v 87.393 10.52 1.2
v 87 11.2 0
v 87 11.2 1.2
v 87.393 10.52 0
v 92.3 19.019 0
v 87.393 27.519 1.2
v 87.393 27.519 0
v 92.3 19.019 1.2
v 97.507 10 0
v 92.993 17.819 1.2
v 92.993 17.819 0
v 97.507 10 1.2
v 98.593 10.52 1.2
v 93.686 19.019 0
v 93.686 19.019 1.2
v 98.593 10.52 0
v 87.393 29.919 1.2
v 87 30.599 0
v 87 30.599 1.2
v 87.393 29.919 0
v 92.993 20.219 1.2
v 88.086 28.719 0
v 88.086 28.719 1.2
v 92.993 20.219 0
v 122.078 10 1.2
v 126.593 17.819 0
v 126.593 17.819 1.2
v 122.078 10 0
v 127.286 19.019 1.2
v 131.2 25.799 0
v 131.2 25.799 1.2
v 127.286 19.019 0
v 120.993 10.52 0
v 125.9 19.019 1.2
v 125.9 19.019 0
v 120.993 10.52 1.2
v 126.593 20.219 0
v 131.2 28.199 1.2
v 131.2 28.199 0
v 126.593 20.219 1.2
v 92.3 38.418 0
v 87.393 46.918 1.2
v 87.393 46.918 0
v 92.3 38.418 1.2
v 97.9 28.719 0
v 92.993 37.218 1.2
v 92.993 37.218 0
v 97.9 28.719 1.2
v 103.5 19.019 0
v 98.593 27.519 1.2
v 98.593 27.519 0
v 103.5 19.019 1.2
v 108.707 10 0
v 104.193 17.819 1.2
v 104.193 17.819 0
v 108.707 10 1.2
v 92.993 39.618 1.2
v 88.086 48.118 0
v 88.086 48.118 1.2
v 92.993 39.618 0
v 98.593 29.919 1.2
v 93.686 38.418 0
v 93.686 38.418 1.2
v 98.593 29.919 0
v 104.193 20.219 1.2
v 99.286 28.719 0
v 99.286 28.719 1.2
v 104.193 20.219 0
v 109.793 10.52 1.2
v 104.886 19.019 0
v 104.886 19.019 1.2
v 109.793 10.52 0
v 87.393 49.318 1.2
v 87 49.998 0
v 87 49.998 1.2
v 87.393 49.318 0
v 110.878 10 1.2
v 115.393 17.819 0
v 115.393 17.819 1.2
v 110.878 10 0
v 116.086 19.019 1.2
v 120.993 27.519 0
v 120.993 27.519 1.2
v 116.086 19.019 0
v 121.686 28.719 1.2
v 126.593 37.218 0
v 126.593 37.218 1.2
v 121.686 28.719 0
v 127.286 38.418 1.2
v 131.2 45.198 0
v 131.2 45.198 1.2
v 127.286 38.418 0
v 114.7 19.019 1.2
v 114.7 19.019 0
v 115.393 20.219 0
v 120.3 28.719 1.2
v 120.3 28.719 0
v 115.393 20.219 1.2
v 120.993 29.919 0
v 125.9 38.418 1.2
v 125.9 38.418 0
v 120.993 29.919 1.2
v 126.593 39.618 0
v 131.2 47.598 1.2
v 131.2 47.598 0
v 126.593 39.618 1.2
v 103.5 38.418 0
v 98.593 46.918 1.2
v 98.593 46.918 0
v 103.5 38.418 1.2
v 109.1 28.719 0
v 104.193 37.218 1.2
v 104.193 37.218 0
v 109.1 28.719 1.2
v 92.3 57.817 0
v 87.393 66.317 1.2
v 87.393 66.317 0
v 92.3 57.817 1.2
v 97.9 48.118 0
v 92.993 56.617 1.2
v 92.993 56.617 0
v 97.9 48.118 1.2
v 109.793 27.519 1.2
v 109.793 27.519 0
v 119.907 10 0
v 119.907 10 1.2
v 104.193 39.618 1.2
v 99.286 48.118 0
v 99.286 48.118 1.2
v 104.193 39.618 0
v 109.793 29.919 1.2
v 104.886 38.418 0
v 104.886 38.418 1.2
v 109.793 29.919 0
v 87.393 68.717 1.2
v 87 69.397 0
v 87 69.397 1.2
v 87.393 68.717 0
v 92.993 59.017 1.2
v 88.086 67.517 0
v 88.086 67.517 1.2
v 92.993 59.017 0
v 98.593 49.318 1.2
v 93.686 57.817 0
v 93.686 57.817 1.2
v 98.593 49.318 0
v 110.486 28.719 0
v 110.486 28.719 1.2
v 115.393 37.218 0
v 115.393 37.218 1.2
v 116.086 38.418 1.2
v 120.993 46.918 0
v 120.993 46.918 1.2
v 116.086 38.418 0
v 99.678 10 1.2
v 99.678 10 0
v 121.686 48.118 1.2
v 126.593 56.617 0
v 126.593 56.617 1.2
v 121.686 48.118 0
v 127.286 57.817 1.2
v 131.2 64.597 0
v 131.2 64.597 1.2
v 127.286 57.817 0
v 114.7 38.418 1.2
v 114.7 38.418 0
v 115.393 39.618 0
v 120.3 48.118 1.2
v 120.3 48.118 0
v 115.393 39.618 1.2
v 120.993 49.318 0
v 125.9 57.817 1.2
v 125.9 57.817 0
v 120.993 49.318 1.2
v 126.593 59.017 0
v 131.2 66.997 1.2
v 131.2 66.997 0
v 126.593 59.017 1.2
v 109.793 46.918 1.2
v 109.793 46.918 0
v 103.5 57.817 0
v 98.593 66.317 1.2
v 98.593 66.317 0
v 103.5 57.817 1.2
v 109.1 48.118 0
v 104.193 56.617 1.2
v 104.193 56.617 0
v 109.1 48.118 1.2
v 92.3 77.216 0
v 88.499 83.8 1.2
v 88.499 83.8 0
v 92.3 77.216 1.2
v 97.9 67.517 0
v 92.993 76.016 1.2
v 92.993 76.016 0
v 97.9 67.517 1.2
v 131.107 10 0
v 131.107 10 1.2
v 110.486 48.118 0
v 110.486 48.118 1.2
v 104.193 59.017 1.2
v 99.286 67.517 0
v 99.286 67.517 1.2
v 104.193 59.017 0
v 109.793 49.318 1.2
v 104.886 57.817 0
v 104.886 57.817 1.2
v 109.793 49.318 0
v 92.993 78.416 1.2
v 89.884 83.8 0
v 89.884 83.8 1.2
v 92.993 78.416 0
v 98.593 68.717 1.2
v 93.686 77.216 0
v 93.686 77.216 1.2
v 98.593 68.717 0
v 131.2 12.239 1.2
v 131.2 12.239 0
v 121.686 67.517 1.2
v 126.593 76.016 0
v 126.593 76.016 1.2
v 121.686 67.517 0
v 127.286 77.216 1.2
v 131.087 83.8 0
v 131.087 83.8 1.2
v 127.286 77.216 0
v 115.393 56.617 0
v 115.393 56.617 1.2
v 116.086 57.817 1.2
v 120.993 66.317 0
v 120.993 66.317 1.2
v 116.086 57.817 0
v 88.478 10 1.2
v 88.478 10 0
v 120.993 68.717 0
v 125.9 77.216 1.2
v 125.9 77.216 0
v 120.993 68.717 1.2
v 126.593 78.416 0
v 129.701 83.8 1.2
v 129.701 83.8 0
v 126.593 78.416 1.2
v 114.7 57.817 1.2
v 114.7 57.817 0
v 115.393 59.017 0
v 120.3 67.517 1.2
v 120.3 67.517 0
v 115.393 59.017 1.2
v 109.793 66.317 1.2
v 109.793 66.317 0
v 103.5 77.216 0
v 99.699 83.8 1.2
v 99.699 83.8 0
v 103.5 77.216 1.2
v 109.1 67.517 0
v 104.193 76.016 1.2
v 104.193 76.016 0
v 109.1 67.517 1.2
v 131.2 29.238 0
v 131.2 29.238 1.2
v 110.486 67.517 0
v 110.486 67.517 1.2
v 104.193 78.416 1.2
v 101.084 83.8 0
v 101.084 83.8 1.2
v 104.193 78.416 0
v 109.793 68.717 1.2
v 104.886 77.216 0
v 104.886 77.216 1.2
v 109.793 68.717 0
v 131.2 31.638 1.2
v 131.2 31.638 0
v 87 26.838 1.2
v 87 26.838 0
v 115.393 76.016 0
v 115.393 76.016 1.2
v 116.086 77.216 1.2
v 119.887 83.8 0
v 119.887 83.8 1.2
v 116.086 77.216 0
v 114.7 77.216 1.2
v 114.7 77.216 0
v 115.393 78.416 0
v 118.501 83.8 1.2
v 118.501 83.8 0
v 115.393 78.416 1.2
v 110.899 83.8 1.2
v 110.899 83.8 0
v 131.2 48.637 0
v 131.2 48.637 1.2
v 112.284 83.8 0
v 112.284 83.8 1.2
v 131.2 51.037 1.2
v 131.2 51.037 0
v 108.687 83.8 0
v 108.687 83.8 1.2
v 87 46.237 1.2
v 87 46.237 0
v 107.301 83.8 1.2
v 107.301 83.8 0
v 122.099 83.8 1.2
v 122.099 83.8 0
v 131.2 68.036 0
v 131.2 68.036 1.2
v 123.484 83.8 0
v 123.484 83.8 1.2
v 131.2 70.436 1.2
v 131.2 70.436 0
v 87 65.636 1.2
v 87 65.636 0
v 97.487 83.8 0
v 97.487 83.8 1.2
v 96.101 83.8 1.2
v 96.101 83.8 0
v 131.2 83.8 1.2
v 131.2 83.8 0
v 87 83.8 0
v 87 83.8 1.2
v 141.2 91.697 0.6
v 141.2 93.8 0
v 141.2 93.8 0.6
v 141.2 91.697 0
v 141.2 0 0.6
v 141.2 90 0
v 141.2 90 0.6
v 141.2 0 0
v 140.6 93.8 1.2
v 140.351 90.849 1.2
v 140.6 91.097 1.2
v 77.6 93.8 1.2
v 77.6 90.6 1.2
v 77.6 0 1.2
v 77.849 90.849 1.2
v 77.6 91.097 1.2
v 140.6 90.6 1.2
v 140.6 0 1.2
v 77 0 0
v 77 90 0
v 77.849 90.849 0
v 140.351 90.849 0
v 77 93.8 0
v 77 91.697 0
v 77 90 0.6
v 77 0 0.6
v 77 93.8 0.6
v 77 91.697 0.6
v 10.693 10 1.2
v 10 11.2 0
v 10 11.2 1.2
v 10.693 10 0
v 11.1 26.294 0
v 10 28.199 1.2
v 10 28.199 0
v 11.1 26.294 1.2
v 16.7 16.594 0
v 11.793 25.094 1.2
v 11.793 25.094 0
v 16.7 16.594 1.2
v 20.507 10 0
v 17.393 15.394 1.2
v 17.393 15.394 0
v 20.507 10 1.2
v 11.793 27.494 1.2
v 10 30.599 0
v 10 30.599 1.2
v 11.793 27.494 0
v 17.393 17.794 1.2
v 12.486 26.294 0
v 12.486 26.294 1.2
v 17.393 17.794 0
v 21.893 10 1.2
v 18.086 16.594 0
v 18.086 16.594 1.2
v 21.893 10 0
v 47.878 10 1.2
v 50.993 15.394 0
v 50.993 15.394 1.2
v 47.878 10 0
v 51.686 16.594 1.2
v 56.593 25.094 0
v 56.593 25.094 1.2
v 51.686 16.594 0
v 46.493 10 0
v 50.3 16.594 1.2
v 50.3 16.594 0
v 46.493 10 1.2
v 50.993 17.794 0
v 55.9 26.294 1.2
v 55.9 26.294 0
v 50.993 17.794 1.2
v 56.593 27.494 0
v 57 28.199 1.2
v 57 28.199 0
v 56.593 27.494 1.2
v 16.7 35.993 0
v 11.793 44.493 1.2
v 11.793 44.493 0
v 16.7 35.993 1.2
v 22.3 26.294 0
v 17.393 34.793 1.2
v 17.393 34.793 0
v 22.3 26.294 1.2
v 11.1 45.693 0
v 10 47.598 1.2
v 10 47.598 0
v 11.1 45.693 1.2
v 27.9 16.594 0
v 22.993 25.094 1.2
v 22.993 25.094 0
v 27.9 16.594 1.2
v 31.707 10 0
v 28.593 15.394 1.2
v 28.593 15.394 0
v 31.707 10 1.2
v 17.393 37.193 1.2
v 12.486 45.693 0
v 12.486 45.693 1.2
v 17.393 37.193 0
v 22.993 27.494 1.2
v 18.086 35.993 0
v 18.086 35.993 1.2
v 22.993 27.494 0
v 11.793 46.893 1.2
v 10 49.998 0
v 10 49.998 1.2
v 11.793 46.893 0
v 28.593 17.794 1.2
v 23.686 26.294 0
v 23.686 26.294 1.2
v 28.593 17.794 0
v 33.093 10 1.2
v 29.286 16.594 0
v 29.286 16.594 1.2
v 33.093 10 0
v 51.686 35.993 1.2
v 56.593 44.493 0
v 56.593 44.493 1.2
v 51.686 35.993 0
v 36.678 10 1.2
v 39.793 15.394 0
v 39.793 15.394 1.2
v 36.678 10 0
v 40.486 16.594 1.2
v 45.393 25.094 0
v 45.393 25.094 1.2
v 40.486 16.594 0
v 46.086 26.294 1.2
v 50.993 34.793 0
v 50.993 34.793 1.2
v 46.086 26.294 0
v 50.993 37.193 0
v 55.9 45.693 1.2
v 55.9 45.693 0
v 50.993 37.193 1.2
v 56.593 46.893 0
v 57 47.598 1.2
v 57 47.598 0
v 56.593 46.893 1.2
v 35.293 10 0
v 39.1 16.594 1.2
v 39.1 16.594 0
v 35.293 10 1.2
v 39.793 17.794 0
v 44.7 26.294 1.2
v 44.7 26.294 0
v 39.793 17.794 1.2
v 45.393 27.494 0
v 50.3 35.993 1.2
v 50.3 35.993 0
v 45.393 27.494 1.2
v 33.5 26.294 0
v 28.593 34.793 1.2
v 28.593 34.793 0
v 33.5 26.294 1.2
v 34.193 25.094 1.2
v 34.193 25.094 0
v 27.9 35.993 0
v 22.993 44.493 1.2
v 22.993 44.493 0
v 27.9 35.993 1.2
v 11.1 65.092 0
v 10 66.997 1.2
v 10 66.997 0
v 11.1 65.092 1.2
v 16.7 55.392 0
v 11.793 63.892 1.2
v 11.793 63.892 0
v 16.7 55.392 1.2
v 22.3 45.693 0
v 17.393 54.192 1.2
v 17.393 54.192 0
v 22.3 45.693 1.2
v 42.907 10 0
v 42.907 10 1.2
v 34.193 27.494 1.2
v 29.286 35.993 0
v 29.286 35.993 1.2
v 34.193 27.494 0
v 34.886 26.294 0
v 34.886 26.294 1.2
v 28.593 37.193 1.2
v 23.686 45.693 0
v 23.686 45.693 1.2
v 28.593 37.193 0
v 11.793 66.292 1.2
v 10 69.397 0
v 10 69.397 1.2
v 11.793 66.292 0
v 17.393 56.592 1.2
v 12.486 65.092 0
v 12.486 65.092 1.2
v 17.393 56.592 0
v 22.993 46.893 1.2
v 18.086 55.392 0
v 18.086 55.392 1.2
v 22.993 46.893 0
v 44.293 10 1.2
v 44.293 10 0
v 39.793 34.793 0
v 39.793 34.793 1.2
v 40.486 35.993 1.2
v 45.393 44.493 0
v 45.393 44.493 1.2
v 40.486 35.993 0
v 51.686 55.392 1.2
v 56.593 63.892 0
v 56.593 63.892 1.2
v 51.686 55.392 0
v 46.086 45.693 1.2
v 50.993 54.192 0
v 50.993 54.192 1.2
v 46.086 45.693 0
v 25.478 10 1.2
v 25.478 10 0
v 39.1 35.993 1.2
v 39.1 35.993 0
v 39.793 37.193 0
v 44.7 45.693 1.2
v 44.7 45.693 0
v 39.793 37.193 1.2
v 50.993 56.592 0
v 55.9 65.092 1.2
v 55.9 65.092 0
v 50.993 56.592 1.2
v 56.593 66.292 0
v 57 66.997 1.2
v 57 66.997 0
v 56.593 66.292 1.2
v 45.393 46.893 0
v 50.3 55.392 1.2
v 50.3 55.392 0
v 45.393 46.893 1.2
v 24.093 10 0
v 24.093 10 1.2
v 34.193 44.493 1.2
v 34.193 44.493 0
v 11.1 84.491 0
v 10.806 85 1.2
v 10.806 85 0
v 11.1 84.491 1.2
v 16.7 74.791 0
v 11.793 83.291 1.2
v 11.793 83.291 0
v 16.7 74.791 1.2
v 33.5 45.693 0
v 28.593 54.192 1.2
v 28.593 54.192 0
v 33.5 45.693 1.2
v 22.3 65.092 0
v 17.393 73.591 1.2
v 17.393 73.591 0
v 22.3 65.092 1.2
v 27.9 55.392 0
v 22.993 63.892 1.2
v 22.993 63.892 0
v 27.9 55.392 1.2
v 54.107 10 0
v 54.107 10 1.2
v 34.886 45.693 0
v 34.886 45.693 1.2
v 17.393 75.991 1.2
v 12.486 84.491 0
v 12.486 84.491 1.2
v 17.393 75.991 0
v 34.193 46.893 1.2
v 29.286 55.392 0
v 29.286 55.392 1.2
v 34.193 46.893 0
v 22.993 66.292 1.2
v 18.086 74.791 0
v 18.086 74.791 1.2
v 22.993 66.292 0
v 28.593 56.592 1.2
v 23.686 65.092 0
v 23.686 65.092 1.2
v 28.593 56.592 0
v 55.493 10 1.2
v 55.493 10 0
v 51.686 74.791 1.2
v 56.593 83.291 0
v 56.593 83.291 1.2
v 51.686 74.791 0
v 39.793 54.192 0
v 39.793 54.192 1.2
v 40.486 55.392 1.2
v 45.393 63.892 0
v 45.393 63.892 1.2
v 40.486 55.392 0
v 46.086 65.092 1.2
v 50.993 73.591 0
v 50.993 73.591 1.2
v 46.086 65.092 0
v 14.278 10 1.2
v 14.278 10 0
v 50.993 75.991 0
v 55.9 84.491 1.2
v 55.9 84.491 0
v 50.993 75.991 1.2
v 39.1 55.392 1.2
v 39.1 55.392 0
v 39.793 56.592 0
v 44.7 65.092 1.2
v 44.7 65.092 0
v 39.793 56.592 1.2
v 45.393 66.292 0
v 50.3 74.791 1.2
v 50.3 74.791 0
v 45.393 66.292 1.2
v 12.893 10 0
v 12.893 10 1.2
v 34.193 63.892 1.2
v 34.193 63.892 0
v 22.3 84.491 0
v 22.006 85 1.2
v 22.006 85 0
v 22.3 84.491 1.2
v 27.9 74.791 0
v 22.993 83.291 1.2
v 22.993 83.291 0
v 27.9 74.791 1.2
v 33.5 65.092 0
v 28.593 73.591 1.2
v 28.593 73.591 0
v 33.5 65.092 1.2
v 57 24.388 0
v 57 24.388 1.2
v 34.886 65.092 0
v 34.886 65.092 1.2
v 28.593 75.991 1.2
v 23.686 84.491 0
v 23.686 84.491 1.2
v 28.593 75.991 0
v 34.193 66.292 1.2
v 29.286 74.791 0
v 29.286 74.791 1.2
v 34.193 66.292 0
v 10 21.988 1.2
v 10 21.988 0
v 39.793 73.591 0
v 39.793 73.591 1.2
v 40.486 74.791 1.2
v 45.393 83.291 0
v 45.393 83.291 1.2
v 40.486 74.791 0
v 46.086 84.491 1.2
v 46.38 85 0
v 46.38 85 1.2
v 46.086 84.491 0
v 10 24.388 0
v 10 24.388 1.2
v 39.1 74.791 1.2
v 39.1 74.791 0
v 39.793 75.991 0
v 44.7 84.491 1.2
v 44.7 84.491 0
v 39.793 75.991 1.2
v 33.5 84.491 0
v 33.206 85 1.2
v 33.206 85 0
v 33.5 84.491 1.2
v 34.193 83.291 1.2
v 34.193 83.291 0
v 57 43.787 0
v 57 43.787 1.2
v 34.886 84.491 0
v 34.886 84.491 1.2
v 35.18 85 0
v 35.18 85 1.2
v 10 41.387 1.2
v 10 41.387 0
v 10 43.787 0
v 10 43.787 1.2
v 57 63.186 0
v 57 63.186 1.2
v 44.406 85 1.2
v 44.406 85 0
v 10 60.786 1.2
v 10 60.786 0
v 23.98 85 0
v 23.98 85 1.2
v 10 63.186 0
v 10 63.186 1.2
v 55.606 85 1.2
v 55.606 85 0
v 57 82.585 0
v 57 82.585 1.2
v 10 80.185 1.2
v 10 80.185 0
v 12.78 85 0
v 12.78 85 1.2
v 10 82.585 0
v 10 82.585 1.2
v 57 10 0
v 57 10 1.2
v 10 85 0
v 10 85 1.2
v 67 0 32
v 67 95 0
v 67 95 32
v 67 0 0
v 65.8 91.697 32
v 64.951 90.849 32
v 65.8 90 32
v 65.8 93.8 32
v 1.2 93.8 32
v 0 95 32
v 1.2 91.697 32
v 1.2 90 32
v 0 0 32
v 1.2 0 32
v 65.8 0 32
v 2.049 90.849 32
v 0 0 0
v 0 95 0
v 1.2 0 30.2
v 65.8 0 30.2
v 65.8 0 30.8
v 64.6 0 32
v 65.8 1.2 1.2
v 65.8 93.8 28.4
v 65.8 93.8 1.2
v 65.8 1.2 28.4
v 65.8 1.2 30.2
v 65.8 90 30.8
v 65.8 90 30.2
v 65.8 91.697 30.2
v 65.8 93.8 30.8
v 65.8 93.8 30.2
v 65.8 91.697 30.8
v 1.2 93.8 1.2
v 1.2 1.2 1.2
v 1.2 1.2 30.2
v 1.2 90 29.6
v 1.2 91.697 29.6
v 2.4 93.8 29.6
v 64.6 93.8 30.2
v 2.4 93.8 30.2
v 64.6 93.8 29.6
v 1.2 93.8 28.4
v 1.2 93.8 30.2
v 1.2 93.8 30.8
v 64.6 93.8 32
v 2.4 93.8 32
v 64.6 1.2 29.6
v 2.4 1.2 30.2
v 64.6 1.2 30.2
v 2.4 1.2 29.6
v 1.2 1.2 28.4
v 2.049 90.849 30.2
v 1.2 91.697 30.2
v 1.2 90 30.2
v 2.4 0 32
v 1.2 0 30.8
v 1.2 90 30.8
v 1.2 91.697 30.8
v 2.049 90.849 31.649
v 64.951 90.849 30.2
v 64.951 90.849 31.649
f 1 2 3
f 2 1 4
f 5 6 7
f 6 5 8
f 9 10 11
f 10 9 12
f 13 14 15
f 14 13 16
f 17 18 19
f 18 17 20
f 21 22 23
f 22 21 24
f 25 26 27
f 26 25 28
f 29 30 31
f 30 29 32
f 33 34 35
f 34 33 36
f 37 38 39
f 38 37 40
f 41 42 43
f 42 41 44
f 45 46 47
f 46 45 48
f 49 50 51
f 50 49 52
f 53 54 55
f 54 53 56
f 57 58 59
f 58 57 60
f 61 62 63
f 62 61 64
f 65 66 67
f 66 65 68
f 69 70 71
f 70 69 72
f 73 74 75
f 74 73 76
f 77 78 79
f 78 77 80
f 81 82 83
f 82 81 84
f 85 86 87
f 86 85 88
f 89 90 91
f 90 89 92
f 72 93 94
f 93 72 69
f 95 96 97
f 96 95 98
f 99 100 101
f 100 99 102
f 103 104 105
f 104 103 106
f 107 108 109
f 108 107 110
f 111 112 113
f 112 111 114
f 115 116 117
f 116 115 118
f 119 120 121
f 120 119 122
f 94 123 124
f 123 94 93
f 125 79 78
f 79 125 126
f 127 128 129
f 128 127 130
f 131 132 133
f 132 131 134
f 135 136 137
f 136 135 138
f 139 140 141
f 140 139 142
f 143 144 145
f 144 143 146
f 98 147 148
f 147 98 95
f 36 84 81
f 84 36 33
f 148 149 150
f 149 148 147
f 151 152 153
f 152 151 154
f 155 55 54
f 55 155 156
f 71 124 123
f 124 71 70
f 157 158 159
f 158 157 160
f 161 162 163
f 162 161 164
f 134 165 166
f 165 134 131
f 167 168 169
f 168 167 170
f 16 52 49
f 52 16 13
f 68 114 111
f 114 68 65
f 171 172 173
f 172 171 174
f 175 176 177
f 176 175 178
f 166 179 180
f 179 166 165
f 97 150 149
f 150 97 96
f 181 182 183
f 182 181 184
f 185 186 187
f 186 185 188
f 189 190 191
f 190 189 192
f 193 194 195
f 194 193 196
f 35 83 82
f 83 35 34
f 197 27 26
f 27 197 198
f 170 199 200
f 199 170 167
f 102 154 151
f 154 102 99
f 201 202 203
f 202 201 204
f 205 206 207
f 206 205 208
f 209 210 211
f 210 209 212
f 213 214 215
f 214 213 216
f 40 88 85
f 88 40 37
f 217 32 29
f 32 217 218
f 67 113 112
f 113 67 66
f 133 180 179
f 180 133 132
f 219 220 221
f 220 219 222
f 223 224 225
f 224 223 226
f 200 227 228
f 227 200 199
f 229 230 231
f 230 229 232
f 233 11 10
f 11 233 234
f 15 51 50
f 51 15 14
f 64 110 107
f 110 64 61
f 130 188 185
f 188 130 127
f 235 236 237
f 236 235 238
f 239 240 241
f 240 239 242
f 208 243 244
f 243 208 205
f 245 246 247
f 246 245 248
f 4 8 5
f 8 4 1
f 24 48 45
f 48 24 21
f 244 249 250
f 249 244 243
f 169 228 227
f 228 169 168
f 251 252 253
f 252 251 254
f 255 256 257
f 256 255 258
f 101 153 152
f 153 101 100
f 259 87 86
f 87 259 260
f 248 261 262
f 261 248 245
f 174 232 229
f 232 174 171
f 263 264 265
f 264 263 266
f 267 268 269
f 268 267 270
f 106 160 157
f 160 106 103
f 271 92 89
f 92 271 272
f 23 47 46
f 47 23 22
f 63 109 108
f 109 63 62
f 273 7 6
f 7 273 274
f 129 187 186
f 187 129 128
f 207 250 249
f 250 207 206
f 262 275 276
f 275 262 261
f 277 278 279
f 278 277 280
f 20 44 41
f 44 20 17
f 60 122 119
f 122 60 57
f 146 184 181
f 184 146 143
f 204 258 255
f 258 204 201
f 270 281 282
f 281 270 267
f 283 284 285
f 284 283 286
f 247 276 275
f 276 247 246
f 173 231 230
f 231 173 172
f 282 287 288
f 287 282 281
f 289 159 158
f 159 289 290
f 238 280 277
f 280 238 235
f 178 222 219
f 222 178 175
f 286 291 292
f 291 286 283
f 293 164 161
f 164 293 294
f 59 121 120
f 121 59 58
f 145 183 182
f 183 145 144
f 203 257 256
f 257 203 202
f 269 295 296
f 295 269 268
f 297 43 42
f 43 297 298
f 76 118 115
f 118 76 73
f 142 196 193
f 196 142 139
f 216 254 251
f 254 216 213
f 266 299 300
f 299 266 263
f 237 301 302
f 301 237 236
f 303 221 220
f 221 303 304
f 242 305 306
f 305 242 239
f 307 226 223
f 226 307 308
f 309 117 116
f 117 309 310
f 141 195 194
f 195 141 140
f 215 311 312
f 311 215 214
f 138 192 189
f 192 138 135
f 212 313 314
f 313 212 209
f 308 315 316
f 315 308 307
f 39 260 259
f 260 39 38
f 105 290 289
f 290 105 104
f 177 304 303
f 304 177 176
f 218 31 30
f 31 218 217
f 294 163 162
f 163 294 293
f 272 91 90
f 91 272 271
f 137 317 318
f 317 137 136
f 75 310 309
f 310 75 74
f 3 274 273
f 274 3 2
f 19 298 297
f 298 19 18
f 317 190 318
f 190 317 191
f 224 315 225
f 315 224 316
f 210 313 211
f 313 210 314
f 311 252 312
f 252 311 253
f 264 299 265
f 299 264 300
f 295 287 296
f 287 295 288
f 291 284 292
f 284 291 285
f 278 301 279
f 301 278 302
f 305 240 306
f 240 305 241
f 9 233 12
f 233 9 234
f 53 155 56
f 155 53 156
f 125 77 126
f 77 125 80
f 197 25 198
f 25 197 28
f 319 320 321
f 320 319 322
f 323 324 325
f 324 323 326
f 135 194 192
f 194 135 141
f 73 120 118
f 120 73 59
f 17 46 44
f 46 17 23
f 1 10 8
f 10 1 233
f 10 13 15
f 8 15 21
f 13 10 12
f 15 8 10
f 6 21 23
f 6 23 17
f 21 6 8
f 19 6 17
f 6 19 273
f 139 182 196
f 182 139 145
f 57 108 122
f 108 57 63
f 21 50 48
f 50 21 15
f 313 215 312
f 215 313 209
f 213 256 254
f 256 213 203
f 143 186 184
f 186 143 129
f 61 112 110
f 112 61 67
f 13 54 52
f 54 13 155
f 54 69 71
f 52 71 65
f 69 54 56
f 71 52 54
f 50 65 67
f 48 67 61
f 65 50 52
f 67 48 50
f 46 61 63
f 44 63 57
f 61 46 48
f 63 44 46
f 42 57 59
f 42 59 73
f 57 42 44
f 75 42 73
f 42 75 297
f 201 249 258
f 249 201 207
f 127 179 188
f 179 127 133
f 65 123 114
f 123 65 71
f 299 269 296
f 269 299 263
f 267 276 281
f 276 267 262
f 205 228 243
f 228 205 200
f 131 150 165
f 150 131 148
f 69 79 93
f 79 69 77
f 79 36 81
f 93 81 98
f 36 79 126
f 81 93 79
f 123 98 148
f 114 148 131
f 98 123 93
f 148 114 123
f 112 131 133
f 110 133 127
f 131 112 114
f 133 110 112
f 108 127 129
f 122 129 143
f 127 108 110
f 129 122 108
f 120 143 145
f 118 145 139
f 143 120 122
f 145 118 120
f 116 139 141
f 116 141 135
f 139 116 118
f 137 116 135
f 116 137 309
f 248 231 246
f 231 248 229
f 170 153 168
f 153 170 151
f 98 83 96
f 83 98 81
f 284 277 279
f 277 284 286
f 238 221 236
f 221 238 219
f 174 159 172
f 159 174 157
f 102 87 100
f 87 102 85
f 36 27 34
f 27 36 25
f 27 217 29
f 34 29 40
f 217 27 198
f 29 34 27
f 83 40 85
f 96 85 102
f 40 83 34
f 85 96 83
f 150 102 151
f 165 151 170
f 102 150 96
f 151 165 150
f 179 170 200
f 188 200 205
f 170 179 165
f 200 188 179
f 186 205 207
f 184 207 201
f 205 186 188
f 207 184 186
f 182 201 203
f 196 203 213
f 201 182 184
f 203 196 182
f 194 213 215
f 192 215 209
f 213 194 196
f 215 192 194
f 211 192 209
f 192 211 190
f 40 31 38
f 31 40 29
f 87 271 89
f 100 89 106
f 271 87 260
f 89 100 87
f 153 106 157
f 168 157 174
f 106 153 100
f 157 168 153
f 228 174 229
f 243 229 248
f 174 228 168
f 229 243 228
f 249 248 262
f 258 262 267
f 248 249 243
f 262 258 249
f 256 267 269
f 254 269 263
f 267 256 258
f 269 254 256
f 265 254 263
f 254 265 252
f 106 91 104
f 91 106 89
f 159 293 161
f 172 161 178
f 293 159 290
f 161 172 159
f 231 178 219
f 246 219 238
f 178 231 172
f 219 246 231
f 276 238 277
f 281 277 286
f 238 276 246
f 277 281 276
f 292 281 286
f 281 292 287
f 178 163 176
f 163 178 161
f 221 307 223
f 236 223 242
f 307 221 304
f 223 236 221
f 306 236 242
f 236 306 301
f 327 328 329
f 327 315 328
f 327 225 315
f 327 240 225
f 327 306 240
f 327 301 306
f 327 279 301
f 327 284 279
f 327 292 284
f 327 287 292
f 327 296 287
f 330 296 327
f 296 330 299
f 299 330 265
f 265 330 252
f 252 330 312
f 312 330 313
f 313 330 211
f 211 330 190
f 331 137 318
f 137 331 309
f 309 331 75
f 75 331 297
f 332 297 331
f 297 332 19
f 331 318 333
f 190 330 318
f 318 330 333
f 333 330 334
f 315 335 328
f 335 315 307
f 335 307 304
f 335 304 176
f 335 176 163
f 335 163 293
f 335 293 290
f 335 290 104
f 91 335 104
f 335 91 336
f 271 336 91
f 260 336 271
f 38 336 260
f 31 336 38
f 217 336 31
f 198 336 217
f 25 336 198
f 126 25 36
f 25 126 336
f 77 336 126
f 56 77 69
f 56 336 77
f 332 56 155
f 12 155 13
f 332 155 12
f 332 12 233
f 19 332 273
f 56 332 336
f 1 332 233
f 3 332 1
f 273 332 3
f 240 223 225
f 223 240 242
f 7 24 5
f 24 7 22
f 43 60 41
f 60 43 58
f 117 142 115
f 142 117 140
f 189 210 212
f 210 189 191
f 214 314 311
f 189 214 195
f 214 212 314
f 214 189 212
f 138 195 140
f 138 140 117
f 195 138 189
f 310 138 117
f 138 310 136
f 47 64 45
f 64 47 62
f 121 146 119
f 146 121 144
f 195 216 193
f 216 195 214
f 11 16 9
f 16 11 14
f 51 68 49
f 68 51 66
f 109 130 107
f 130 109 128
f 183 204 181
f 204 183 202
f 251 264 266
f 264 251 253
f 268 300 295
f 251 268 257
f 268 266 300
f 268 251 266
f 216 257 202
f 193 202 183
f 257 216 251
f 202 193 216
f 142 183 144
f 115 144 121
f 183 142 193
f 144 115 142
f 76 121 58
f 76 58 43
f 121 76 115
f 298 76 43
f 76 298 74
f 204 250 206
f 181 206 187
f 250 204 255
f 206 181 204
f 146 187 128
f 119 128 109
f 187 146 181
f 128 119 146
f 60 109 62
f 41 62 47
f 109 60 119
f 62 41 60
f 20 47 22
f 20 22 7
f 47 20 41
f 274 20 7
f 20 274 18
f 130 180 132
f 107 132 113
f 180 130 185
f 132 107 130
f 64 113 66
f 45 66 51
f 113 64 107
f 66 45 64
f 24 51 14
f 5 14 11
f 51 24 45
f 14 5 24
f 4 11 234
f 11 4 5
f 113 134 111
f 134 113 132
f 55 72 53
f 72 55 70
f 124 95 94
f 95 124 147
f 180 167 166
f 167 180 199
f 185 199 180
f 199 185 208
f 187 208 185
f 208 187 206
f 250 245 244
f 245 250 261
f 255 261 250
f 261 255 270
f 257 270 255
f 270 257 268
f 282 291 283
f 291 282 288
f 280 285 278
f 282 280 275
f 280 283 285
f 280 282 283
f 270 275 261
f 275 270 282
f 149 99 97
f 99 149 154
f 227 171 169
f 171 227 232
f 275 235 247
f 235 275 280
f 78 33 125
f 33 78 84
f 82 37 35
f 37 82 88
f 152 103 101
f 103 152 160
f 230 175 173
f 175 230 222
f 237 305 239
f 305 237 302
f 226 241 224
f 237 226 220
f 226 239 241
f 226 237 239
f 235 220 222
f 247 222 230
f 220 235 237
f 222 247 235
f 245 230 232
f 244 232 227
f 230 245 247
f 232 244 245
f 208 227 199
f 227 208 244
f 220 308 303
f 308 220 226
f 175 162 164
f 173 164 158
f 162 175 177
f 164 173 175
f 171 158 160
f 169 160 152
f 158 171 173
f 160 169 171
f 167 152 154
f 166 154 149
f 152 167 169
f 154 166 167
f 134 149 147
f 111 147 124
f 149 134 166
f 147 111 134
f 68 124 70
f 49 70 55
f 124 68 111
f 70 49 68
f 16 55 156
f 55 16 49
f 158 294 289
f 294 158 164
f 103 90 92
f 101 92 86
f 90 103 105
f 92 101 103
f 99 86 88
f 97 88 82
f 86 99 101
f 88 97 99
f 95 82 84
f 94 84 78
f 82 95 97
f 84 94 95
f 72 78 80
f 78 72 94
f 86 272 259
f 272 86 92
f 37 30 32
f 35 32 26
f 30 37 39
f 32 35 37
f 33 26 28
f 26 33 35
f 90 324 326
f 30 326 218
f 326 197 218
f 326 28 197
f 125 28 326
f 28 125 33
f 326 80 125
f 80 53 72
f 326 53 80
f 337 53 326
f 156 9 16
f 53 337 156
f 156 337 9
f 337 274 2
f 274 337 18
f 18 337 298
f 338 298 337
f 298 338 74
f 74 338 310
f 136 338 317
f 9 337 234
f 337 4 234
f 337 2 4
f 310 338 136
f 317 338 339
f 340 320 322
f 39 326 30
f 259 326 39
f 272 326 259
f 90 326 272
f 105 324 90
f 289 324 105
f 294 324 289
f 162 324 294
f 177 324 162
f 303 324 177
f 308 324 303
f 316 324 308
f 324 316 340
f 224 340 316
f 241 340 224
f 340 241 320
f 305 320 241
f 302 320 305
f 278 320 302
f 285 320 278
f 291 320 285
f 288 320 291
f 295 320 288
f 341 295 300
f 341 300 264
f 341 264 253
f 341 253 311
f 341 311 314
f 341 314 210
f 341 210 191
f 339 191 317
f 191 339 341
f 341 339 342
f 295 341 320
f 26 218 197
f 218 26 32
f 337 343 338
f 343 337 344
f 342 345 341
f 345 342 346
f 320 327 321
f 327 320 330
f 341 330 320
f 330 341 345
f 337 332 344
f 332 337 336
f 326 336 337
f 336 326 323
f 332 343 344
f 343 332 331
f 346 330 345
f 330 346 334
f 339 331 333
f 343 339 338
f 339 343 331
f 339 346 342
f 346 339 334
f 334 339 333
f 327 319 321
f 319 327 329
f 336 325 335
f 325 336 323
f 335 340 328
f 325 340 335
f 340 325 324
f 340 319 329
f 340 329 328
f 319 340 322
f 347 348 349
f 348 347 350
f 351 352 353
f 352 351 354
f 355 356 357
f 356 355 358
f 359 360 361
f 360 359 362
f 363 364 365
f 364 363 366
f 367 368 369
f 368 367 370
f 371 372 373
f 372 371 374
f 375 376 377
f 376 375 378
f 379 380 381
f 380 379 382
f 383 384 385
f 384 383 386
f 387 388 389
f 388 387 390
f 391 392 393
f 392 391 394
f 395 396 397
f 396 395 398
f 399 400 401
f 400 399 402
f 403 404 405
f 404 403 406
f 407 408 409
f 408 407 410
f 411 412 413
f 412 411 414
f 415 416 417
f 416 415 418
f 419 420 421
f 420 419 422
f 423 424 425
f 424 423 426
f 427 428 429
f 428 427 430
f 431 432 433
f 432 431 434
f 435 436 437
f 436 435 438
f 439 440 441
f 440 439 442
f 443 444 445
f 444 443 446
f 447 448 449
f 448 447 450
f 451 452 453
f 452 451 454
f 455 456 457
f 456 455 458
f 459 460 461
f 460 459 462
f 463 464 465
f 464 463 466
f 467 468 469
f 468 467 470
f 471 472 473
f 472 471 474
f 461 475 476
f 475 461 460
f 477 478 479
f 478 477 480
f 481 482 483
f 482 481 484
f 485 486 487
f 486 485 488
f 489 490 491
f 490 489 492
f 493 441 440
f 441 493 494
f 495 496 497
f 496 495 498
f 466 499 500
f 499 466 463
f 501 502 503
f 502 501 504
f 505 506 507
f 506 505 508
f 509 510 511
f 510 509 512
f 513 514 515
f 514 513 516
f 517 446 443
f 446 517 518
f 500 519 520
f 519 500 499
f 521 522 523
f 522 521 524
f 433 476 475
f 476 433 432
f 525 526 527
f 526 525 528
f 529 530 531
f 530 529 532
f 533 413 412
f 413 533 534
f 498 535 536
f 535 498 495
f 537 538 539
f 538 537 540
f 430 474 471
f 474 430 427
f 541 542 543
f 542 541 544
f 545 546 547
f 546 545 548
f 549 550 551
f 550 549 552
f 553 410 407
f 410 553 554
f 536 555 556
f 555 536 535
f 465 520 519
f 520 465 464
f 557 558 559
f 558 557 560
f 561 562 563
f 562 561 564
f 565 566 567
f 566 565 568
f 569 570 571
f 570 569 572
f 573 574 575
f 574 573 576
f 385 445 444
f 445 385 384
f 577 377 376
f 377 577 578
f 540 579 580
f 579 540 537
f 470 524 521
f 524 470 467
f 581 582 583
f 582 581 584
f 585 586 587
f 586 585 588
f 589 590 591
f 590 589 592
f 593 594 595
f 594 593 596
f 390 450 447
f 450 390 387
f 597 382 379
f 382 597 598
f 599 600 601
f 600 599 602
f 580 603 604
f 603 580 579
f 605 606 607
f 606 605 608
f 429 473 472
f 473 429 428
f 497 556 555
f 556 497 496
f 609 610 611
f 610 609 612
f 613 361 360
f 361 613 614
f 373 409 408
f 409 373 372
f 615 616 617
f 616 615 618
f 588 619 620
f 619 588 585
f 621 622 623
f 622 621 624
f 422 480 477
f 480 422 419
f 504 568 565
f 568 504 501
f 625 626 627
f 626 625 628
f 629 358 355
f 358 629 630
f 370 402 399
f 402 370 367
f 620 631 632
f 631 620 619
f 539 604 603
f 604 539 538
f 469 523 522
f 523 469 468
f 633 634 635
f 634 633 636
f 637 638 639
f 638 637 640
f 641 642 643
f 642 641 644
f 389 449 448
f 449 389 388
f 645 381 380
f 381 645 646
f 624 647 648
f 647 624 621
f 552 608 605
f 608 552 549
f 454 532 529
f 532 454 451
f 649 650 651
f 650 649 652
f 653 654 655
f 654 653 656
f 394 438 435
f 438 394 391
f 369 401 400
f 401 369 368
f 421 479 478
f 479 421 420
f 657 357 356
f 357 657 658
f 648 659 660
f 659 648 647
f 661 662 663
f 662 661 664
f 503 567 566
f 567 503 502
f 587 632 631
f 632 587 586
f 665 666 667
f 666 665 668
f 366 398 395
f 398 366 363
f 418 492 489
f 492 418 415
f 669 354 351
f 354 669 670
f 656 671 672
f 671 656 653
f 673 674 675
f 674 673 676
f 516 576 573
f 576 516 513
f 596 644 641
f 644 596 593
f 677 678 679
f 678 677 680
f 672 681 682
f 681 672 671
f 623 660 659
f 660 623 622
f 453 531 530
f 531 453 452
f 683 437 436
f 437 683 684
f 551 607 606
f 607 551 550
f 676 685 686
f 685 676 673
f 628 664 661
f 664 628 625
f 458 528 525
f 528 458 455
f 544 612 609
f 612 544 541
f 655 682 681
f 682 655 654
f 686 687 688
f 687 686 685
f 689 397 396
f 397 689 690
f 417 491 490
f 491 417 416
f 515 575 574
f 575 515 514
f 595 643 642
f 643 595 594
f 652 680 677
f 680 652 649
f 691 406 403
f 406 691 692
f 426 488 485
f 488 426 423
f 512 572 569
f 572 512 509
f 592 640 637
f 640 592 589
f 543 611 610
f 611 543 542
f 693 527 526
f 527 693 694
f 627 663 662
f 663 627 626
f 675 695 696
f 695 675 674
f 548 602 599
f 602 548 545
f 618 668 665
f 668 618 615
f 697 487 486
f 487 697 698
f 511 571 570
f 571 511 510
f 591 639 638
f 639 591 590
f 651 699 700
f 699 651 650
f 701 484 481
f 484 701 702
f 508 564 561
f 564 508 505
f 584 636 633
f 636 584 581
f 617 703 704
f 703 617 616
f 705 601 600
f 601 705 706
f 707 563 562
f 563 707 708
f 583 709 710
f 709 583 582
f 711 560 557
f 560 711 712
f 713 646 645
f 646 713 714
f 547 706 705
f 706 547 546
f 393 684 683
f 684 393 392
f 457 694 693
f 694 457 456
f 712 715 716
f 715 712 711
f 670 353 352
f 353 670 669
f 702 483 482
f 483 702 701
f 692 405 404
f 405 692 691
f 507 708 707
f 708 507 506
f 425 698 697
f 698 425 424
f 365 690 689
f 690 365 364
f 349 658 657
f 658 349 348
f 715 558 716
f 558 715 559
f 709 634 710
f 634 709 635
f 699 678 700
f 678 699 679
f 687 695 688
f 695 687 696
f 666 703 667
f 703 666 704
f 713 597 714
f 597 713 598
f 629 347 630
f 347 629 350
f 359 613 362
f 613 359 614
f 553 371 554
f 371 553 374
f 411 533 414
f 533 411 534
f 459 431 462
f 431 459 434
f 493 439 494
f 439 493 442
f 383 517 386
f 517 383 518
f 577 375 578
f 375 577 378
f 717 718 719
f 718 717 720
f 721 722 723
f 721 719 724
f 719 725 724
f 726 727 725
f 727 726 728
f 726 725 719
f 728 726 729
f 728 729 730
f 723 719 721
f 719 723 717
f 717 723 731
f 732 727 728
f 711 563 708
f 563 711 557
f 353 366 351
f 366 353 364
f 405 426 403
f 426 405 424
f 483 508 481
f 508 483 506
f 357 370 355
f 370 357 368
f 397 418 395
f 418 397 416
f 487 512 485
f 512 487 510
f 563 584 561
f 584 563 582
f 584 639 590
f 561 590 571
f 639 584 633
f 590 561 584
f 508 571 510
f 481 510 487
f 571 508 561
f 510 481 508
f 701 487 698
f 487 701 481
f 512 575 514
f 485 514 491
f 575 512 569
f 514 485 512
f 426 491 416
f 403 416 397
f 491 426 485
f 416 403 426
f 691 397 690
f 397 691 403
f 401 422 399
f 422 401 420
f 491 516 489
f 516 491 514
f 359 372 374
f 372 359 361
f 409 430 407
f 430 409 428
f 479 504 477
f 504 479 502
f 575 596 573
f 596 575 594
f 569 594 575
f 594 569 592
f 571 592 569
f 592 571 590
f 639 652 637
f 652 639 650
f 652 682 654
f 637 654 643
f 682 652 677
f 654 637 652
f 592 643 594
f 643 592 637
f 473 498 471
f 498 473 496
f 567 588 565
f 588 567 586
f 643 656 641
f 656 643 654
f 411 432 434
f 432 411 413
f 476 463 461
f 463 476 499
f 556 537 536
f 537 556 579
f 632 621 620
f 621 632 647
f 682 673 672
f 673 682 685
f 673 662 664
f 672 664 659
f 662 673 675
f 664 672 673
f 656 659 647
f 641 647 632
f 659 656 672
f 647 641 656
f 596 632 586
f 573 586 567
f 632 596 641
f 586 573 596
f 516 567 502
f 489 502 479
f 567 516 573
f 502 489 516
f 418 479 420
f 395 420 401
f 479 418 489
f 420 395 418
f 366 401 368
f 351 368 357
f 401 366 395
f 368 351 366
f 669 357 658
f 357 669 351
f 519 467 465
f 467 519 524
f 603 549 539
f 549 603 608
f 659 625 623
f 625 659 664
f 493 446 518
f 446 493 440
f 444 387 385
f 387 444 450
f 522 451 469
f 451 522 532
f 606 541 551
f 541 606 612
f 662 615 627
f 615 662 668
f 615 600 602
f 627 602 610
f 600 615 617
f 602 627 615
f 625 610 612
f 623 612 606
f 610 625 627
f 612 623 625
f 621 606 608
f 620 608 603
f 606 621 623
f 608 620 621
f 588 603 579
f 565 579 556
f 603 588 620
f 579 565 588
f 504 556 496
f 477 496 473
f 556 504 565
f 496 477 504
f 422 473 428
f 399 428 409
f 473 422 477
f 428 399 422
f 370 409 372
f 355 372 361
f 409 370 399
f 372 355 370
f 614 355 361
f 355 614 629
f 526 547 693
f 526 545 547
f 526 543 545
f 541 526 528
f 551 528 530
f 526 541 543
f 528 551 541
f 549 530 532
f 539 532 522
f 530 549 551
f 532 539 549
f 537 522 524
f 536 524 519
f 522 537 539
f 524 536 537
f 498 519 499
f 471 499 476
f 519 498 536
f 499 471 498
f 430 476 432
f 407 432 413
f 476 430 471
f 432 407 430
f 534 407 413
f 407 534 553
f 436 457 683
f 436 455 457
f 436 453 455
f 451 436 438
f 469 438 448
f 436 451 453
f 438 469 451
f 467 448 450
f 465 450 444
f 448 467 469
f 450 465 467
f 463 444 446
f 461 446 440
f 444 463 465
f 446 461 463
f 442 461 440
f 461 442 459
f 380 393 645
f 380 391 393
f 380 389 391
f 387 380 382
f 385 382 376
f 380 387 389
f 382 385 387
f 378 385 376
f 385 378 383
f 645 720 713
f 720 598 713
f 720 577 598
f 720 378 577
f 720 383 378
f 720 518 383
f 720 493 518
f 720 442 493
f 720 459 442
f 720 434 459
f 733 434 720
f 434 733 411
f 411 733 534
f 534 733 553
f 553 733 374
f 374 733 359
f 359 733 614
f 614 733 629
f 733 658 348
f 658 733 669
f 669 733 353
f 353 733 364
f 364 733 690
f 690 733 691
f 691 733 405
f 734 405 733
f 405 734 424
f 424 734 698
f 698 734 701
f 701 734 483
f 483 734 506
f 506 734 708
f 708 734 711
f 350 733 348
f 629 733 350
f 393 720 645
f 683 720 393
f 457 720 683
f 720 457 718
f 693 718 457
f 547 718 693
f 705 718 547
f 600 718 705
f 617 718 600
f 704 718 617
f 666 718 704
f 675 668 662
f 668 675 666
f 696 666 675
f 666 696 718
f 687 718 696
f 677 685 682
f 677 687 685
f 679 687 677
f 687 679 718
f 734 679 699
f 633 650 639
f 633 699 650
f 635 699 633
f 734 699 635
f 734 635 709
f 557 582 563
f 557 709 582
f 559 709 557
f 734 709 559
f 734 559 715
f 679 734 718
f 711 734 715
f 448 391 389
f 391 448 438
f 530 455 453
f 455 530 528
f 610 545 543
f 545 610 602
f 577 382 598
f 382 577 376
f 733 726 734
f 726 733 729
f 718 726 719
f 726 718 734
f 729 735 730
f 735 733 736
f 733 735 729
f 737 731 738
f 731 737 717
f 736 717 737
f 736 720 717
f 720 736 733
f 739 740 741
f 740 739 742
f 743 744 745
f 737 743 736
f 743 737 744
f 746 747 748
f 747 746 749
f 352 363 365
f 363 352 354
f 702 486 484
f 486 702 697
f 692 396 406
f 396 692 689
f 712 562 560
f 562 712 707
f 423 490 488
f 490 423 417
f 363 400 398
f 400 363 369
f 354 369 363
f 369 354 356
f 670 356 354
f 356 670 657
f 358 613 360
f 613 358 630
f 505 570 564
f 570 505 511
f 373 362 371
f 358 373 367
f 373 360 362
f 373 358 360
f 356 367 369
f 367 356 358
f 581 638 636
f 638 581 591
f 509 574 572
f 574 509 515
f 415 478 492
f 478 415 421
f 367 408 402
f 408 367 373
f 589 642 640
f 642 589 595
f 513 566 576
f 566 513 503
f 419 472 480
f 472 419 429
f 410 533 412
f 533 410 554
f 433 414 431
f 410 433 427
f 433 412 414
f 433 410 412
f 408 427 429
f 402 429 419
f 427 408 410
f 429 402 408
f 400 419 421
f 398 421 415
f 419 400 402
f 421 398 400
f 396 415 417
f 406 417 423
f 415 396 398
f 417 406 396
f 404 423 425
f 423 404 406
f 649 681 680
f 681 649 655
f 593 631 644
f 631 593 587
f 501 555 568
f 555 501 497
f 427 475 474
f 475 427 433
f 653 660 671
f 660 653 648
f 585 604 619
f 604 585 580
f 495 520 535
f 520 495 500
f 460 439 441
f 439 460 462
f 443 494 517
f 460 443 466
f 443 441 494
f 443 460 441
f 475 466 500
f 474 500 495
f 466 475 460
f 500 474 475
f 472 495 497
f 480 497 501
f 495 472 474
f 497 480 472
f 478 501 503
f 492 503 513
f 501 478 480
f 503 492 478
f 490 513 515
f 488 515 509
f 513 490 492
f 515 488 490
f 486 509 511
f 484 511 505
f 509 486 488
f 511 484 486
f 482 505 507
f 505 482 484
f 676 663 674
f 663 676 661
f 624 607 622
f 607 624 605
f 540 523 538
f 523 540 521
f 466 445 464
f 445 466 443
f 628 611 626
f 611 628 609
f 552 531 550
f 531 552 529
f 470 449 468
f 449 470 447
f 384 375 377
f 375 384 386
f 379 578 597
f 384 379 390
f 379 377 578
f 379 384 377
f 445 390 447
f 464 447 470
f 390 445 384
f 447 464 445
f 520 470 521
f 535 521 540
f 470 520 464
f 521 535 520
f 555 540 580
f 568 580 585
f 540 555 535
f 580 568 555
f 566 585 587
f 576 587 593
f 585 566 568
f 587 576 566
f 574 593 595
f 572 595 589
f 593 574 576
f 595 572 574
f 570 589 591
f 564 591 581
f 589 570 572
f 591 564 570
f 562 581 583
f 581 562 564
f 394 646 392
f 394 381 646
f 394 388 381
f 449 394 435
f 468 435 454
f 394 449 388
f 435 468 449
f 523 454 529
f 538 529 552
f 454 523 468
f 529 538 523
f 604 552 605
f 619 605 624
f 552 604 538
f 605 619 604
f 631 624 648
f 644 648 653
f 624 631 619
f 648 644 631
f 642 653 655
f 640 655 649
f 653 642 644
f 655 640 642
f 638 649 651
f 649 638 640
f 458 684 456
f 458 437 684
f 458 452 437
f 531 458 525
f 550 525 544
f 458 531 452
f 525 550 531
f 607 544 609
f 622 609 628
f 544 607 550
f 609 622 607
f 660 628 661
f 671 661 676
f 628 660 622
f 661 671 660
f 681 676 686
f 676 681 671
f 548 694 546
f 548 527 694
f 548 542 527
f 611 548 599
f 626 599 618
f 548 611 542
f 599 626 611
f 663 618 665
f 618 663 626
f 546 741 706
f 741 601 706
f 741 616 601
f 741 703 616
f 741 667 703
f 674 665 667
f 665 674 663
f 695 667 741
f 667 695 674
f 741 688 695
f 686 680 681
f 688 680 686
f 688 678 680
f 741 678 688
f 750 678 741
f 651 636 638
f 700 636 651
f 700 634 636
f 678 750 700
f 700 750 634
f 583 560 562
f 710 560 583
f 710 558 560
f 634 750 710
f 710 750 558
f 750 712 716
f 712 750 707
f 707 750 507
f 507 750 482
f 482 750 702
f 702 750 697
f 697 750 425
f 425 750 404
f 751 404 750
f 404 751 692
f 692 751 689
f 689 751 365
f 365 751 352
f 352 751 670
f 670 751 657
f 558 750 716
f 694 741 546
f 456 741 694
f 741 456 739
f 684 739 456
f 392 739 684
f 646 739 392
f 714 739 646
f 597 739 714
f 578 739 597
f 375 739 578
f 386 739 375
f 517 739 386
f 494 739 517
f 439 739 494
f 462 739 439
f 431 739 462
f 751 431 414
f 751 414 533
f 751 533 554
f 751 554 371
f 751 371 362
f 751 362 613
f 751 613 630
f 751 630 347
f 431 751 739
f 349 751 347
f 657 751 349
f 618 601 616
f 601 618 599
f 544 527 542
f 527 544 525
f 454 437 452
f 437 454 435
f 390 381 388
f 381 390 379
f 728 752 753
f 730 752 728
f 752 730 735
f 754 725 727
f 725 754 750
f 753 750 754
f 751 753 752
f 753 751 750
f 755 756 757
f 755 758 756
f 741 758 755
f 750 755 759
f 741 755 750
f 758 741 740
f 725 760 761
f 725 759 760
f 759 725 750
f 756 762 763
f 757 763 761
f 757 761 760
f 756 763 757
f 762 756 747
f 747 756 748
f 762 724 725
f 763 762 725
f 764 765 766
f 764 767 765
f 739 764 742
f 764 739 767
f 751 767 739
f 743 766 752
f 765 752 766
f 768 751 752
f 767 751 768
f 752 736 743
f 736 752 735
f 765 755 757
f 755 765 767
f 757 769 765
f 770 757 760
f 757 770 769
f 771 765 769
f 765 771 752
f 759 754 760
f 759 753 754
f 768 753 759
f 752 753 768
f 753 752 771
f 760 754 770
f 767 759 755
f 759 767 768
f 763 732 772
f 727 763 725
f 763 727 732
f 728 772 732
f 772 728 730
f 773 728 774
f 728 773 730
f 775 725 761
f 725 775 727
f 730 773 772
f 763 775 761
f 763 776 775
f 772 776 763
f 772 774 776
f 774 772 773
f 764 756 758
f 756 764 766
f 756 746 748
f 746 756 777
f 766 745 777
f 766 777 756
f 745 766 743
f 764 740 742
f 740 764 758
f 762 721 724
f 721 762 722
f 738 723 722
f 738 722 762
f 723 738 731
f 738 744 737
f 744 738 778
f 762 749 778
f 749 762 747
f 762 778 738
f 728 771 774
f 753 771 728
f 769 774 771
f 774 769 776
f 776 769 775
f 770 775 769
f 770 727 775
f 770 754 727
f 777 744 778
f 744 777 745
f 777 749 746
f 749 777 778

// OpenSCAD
// file: hashedSquare.scad
module hashedSquare(x, y, z = 1.2, space = 7) {
    angle = 30;
	steps = space + z;

	count = round((x + y) / steps) + 1;

    difference() {
        cube([x, y, z *3]);

		for (i = [0: 1: count]) {
			translate([i * steps, -z, 0])
				rotate([0, 0, angle])
					cube([z, y / cos(angle) + z *2, z *3]);
			translate([x - i * steps, -z, 0])
				rotate([0, 0, -angle])
					cube([z, y / cos(angle) + z *2, z *3]);
		}
    }
}
// file: touchGap.scad
module touchGap(width, height, material = 1.2) {
	translate([0, 0, -height]) {
		cube (size = [material *3, width, height]);
	
	translate([0, width /2, 0])
		rotate([0, 90, 0]) 
			cylinder(h = material *3, d = width);
	}
}
// file: box.scad
include <touchGap.scad>;
include <hashedSquare.scad>;

module box(x = 0.0, y = 0.0, z = 0.0, material = 1.2, touchGaps = [false, false, false, false], eco = [false, false, false, false, true], hashSpace = 7) {
	echo("######### BOX size X = ", x, ", Y = ", y, ", Z = ", z, " #########");

	tempX = x * 0.6 ;
	tempY = y * 0.6;
		
	xDiameter = tempX > 40.0 ? 40.0 : tempX;
	yDiameter = tempY > 40.0 ? 40.0 : tempY;
	
	difference() {
		cube(size = [x, y, z]);
		
		translate([material, material, material]) {
			//cube(size = [x - (material * 2), y - (material * 2), z - material]);
			if (z > material)
				cube(size = [x - (material * 2), y - (material * 2), z]);
			if (z <= material)
				cube(size = [x - (material * 2), y - (material * 2), z - material]);
		}
		
		if (touchGaps[0]) //front
			translate([xDiameter + (x - xDiameter) /2, -material, z  + 0.1])
				rotate([0,0,90])
					touchGap(width = xDiameter, height = xDiameter * 0.5, material = material);

		if (touchGaps[1]) //left
			translate([0, (y - yDiameter) /2, z])
				touchGap(width = yDiameter, height = yDiameter * 0.5, material = material);

		if (touchGaps[2]) //back
			translate([xDiameter + (x - xDiameter) /2, y - material *2, z + 0.1])
				rotate([0,0,90])
					touchGap(width = xDiameter, height = xDiameter * 0.5, material = material);

		if (touchGaps[3]) //right
			translate([x - material * 2, (y - yDiameter) /2, z])
				touchGap(width = yDiameter, height = yDiameter * 0.5, material = material);
		
		ecoDistance = 10;
		ecoX = x - ecoDistance * 2;
		ecoY = y - ecoDistance * 2;
		
		frontY = touchGaps[0] ? z - xDiameter - ecoDistance * 2: z - ecoDistance * 2;
		leftY = touchGaps[1] ? z - xDiameter - ecoDistance * 2: z - ecoDistance * 2;
		backY = touchGaps[2] ? z - xDiameter - ecoDistance * 2: z - ecoDistance * 2;
		rightY = touchGaps[3] ? z - xDiameter - ecoDistance * 2: z - ecoDistance * 2;
		
		if (eco) {
			sideWidth = y - ecoDistance * 2;
			sideHeight = z - ecoDistance * 2;

			//front
			if (eco[0])
				translate([ecoDistance, material *2, ecoDistance])
					rotate([90, 0, 0])
						hashedSquare(x = ecoX, y = frontY, z = material, space = hashSpace);

			//left
			if (eco[1])
				translate([0, ecoDistance, ecoDistance])
					rotate([90, 0, 90])
						hashedSquare(x = ecoY, y = leftY, z = material, space = hashSpace);

			//back
			if (eco[2])
				translate([ecoDistance, y + material, ecoDistance])
					rotate([90, 0, 0])
						hashedSquare(x = ecoX, y = backY, z = material, space = hashSpace);

			//right
			if (eco[3])
				translate([x - material *2, ecoDistance, ecoDistance])
					rotate([90, 0, 90])
						hashedSquare(x = ecoY, y = rightY, z = material, space = hashSpace);

			//bottom
			if (eco[4])
				translate([ecoDistance, ecoDistance, -0.1])
					hashedSquare(x = x - ecoDistance * 2, y = y - ecoDistance * 2, z = material, space = hashSpace);
		}
	}
}

// x = 100;
// y = 100;
// z = 100;

// x = 73;
// y = 65;
// z = 95;

// box(v = [x, y , z], touchGaps = [true, false, true, false], eco = [true, true, true, true, true]);

// translate([x + 30, 0, 0])
// 	box(v = [x, y , z], touchGaps = [false, false, false, false], eco = [true, true, true, true, true]);
// file: cube+Support.scad
module cubeLeftSupported(y = 0.0, z = 1.2, angle = 45, material = 1.2) {
	x = material;
	difference() {
		cube(size = [x, y, z]);
			translate(v = [0, -material, 0])
				rotate(a = [0, angle, 0])
					cube(size = [x, y + material * 2, material * 2]);
	}
}

module cubeRightSupported(y = 0.0, z = 1.2, angle = 45, material = 1.2) {
	translate(v = [material, y, 0]) 
		rotate(a = [0, 0, 180])
			cubeLeftSupported(y = y, z = z, angle = angle, material = material);
}

// material = 1.2;
// y = 37;
// z = 35;

// cubeLeftSupported(angle = 45, y = y, z = z, material = material);

// translate(v = [15, 0 , 0]) 
// 	cubeRightSupported(angle = 45, y = y, z = z, material = material);
// main file
//include <hashedSquare.scad>;
include <cube+Support.scad>
include <box.scad>;

module boxWithLid(x = 0.0, y = 0.0, z = 0.0, material = 1.2, eco = [false, false, false, false, true, true], hashSpace = 7, toleranceSpace = 0.2, print = false) {
	// eco[0] = front	// eco[1] = left	// eco[2] = back	// eco[3] = right	// eco[4] = bottom	// eco[5] = lid

	lidPosX = print ? x + 10 : material + toleranceSpace;
	lidPosZ = print ? 0 : z - material * 1.5;

	translate(v = [lidPosX, 0 , lidPosZ])
		lid(x = x - toleranceSpace * 2, y = y, z = z, hashSpace = hashSpace);
	
	difference() {
		box(x = x, y = y, z = z, material = material, eco = eco, hashSpace = hashSpace);
		translate(v = [material, -material, z - material * 1.5])
			cube(size = [x - material *2, material * 3, material * 3]);
	}
	
	translate(v = [material, 0, z - material * 3])
		cubeLeftSupported(y = y, z = material * 1.5);
	translate(v = [material, 0, z - material])
		cubeLeftSupported(y = y, z = material);
	translate(v = [material, y - 5, z - material * 2]) 
		rotate(a = [0, 0, 45])
			cube(size = [material, material, material * 2]);
	
	translate(v = [x - material * 2, 0, z- material * 3])
		cubeRightSupported(y = y, z = material * 1.5);
	translate(v = [x - material * 2, 0, z - material])
		cubeRightSupported(y = y, z = material);
	translate(v = [x - material, y - 5, z - material * 2]) 
		rotate(a = [0, 0, 45])
			cube(size = [material, material, material * 2]);
	
}

module lid(x = 0.0, y = 0.0, z = 0.0, material = 1.2, eco = [false, false, false, false, true, true], hashSpace = 7) {
	//translate([x + 20 + material, material, 0]){
	lidX = x - material * 2;
	lidY = y - material;
	
	difference() {
		box(x = lidX, y = lidY, z = material, eco = [eco[0], eco[1], eco[2], eco[3], eco[5]], hashSpace = hashSpace);
		translate(v = [0, -material, material * 0.5])
			rotate(a = [0, -45, 0])
				cube(size = [material, lidY + material * 2, material]);
		translate(v = [0, lidY - 5 + material, -material]) 
			rotate(a = [0, 0, 45])
				cube(size = [material, material, material * 3]);

		translate(v = [lidX, -material, material * 0.5])
			rotate(a = [0, -45, 0])
				cube(size = [material, lidY + material * 2, material]);
		translate(v = [lidX, lidY - 5 + material, -material]) 
			rotate(a = [0, 0, 45])
				cube(size = [material, material, material * 3]);
	}
}

// x = 100;
// y = 100;
// z = 100;

// x = 73;
// y = 65;
// z = 95;

x = 67;
y = 95;
z = 32;

boxWithLid(x = x, y = y, z = z, hashSpace = 10, print = true);
